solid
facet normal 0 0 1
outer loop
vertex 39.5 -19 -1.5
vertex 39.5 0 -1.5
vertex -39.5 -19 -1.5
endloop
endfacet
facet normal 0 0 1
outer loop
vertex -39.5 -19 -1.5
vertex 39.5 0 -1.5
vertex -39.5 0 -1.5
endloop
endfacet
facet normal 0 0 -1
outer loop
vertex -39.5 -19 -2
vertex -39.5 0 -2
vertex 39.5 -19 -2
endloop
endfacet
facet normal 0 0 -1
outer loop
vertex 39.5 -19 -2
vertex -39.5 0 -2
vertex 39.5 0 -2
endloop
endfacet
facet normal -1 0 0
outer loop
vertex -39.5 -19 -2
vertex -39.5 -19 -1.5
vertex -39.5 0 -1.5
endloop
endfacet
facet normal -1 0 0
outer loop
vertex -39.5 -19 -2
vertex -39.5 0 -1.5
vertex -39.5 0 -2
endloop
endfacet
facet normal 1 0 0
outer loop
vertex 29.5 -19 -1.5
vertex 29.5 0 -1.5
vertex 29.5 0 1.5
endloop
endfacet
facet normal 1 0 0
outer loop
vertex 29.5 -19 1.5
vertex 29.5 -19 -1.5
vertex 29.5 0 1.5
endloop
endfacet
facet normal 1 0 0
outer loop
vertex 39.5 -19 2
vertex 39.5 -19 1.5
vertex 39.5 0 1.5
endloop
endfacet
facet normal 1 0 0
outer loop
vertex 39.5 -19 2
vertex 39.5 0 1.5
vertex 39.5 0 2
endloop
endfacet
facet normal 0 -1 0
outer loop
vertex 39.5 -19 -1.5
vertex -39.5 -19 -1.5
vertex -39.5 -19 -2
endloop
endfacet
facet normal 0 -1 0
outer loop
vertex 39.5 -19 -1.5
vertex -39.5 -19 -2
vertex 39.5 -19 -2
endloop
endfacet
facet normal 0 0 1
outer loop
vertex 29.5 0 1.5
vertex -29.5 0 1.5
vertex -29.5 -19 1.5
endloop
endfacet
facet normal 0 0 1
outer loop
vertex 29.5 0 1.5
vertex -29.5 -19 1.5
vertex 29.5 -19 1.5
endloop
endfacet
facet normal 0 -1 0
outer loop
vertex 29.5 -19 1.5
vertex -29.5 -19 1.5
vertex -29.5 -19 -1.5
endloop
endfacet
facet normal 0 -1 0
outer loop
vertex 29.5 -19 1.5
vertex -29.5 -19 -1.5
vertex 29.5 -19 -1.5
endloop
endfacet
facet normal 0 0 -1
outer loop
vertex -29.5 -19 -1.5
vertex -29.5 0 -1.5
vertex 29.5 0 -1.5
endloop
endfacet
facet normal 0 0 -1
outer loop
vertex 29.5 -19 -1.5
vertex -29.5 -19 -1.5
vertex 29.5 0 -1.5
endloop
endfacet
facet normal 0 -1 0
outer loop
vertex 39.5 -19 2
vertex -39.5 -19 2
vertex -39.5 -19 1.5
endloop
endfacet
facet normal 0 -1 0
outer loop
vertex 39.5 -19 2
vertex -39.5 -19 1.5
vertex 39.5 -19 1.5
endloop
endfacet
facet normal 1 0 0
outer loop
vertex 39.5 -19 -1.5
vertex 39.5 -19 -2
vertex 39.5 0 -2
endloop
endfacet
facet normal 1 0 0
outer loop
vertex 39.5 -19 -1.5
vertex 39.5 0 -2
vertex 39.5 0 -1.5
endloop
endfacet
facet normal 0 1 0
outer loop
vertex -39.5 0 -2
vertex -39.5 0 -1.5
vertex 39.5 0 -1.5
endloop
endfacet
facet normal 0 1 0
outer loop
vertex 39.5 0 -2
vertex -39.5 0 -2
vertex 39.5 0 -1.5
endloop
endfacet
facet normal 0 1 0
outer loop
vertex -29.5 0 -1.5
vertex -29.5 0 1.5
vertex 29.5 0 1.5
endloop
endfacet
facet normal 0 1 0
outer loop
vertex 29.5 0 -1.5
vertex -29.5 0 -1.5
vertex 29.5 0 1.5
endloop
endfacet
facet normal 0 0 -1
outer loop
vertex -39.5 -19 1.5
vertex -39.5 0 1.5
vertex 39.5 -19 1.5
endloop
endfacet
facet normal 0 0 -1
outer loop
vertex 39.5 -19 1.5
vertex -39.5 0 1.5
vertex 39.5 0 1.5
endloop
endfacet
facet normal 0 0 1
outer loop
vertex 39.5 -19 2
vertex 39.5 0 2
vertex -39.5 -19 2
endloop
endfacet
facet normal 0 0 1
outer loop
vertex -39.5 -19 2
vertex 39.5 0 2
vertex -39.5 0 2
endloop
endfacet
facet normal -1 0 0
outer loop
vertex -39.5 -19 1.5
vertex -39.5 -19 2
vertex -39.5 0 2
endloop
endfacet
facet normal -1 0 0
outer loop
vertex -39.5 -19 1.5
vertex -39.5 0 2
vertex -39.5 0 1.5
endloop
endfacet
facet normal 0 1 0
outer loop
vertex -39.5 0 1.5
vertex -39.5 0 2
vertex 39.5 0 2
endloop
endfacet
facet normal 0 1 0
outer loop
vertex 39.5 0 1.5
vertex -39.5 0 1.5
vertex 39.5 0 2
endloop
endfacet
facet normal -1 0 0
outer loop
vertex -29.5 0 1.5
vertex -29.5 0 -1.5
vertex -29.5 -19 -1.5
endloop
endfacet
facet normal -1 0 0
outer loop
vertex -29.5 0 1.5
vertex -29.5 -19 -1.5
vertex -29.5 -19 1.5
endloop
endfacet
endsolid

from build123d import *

# Parameters (mm, degrees)
F1_DEPTH = 19
F0_W     = 59
F0_H     = 3
F2_DEPTH = 19


with BuildPart() as f1:
    # F0 (on Front) → F1 (new body)
    with BuildSketch(Plane.XZ):
        Polygon((-29.5, 1.5), (29.5, 1.5), (39.5, 1.5), (39.5, 2), (-39.5, 2), (-39.5, 1.5), align=None)
        Polygon((39.5, -1.5), (29.5, -1.5), (-29.5, -1.5), (-39.5, -1.5), (-39.5, -2), (39.5, -2), align=None)
    extrude(amount=F1_DEPTH)


with BuildPart() as f2:
    # F0 (on Front) → F2 (new body)
    with BuildSketch(Plane.XZ):
        Rectangle(F0_W, F0_H)
    extrude(amount=F2_DEPTH)


solid = Compound([f1.part, f2.part])
